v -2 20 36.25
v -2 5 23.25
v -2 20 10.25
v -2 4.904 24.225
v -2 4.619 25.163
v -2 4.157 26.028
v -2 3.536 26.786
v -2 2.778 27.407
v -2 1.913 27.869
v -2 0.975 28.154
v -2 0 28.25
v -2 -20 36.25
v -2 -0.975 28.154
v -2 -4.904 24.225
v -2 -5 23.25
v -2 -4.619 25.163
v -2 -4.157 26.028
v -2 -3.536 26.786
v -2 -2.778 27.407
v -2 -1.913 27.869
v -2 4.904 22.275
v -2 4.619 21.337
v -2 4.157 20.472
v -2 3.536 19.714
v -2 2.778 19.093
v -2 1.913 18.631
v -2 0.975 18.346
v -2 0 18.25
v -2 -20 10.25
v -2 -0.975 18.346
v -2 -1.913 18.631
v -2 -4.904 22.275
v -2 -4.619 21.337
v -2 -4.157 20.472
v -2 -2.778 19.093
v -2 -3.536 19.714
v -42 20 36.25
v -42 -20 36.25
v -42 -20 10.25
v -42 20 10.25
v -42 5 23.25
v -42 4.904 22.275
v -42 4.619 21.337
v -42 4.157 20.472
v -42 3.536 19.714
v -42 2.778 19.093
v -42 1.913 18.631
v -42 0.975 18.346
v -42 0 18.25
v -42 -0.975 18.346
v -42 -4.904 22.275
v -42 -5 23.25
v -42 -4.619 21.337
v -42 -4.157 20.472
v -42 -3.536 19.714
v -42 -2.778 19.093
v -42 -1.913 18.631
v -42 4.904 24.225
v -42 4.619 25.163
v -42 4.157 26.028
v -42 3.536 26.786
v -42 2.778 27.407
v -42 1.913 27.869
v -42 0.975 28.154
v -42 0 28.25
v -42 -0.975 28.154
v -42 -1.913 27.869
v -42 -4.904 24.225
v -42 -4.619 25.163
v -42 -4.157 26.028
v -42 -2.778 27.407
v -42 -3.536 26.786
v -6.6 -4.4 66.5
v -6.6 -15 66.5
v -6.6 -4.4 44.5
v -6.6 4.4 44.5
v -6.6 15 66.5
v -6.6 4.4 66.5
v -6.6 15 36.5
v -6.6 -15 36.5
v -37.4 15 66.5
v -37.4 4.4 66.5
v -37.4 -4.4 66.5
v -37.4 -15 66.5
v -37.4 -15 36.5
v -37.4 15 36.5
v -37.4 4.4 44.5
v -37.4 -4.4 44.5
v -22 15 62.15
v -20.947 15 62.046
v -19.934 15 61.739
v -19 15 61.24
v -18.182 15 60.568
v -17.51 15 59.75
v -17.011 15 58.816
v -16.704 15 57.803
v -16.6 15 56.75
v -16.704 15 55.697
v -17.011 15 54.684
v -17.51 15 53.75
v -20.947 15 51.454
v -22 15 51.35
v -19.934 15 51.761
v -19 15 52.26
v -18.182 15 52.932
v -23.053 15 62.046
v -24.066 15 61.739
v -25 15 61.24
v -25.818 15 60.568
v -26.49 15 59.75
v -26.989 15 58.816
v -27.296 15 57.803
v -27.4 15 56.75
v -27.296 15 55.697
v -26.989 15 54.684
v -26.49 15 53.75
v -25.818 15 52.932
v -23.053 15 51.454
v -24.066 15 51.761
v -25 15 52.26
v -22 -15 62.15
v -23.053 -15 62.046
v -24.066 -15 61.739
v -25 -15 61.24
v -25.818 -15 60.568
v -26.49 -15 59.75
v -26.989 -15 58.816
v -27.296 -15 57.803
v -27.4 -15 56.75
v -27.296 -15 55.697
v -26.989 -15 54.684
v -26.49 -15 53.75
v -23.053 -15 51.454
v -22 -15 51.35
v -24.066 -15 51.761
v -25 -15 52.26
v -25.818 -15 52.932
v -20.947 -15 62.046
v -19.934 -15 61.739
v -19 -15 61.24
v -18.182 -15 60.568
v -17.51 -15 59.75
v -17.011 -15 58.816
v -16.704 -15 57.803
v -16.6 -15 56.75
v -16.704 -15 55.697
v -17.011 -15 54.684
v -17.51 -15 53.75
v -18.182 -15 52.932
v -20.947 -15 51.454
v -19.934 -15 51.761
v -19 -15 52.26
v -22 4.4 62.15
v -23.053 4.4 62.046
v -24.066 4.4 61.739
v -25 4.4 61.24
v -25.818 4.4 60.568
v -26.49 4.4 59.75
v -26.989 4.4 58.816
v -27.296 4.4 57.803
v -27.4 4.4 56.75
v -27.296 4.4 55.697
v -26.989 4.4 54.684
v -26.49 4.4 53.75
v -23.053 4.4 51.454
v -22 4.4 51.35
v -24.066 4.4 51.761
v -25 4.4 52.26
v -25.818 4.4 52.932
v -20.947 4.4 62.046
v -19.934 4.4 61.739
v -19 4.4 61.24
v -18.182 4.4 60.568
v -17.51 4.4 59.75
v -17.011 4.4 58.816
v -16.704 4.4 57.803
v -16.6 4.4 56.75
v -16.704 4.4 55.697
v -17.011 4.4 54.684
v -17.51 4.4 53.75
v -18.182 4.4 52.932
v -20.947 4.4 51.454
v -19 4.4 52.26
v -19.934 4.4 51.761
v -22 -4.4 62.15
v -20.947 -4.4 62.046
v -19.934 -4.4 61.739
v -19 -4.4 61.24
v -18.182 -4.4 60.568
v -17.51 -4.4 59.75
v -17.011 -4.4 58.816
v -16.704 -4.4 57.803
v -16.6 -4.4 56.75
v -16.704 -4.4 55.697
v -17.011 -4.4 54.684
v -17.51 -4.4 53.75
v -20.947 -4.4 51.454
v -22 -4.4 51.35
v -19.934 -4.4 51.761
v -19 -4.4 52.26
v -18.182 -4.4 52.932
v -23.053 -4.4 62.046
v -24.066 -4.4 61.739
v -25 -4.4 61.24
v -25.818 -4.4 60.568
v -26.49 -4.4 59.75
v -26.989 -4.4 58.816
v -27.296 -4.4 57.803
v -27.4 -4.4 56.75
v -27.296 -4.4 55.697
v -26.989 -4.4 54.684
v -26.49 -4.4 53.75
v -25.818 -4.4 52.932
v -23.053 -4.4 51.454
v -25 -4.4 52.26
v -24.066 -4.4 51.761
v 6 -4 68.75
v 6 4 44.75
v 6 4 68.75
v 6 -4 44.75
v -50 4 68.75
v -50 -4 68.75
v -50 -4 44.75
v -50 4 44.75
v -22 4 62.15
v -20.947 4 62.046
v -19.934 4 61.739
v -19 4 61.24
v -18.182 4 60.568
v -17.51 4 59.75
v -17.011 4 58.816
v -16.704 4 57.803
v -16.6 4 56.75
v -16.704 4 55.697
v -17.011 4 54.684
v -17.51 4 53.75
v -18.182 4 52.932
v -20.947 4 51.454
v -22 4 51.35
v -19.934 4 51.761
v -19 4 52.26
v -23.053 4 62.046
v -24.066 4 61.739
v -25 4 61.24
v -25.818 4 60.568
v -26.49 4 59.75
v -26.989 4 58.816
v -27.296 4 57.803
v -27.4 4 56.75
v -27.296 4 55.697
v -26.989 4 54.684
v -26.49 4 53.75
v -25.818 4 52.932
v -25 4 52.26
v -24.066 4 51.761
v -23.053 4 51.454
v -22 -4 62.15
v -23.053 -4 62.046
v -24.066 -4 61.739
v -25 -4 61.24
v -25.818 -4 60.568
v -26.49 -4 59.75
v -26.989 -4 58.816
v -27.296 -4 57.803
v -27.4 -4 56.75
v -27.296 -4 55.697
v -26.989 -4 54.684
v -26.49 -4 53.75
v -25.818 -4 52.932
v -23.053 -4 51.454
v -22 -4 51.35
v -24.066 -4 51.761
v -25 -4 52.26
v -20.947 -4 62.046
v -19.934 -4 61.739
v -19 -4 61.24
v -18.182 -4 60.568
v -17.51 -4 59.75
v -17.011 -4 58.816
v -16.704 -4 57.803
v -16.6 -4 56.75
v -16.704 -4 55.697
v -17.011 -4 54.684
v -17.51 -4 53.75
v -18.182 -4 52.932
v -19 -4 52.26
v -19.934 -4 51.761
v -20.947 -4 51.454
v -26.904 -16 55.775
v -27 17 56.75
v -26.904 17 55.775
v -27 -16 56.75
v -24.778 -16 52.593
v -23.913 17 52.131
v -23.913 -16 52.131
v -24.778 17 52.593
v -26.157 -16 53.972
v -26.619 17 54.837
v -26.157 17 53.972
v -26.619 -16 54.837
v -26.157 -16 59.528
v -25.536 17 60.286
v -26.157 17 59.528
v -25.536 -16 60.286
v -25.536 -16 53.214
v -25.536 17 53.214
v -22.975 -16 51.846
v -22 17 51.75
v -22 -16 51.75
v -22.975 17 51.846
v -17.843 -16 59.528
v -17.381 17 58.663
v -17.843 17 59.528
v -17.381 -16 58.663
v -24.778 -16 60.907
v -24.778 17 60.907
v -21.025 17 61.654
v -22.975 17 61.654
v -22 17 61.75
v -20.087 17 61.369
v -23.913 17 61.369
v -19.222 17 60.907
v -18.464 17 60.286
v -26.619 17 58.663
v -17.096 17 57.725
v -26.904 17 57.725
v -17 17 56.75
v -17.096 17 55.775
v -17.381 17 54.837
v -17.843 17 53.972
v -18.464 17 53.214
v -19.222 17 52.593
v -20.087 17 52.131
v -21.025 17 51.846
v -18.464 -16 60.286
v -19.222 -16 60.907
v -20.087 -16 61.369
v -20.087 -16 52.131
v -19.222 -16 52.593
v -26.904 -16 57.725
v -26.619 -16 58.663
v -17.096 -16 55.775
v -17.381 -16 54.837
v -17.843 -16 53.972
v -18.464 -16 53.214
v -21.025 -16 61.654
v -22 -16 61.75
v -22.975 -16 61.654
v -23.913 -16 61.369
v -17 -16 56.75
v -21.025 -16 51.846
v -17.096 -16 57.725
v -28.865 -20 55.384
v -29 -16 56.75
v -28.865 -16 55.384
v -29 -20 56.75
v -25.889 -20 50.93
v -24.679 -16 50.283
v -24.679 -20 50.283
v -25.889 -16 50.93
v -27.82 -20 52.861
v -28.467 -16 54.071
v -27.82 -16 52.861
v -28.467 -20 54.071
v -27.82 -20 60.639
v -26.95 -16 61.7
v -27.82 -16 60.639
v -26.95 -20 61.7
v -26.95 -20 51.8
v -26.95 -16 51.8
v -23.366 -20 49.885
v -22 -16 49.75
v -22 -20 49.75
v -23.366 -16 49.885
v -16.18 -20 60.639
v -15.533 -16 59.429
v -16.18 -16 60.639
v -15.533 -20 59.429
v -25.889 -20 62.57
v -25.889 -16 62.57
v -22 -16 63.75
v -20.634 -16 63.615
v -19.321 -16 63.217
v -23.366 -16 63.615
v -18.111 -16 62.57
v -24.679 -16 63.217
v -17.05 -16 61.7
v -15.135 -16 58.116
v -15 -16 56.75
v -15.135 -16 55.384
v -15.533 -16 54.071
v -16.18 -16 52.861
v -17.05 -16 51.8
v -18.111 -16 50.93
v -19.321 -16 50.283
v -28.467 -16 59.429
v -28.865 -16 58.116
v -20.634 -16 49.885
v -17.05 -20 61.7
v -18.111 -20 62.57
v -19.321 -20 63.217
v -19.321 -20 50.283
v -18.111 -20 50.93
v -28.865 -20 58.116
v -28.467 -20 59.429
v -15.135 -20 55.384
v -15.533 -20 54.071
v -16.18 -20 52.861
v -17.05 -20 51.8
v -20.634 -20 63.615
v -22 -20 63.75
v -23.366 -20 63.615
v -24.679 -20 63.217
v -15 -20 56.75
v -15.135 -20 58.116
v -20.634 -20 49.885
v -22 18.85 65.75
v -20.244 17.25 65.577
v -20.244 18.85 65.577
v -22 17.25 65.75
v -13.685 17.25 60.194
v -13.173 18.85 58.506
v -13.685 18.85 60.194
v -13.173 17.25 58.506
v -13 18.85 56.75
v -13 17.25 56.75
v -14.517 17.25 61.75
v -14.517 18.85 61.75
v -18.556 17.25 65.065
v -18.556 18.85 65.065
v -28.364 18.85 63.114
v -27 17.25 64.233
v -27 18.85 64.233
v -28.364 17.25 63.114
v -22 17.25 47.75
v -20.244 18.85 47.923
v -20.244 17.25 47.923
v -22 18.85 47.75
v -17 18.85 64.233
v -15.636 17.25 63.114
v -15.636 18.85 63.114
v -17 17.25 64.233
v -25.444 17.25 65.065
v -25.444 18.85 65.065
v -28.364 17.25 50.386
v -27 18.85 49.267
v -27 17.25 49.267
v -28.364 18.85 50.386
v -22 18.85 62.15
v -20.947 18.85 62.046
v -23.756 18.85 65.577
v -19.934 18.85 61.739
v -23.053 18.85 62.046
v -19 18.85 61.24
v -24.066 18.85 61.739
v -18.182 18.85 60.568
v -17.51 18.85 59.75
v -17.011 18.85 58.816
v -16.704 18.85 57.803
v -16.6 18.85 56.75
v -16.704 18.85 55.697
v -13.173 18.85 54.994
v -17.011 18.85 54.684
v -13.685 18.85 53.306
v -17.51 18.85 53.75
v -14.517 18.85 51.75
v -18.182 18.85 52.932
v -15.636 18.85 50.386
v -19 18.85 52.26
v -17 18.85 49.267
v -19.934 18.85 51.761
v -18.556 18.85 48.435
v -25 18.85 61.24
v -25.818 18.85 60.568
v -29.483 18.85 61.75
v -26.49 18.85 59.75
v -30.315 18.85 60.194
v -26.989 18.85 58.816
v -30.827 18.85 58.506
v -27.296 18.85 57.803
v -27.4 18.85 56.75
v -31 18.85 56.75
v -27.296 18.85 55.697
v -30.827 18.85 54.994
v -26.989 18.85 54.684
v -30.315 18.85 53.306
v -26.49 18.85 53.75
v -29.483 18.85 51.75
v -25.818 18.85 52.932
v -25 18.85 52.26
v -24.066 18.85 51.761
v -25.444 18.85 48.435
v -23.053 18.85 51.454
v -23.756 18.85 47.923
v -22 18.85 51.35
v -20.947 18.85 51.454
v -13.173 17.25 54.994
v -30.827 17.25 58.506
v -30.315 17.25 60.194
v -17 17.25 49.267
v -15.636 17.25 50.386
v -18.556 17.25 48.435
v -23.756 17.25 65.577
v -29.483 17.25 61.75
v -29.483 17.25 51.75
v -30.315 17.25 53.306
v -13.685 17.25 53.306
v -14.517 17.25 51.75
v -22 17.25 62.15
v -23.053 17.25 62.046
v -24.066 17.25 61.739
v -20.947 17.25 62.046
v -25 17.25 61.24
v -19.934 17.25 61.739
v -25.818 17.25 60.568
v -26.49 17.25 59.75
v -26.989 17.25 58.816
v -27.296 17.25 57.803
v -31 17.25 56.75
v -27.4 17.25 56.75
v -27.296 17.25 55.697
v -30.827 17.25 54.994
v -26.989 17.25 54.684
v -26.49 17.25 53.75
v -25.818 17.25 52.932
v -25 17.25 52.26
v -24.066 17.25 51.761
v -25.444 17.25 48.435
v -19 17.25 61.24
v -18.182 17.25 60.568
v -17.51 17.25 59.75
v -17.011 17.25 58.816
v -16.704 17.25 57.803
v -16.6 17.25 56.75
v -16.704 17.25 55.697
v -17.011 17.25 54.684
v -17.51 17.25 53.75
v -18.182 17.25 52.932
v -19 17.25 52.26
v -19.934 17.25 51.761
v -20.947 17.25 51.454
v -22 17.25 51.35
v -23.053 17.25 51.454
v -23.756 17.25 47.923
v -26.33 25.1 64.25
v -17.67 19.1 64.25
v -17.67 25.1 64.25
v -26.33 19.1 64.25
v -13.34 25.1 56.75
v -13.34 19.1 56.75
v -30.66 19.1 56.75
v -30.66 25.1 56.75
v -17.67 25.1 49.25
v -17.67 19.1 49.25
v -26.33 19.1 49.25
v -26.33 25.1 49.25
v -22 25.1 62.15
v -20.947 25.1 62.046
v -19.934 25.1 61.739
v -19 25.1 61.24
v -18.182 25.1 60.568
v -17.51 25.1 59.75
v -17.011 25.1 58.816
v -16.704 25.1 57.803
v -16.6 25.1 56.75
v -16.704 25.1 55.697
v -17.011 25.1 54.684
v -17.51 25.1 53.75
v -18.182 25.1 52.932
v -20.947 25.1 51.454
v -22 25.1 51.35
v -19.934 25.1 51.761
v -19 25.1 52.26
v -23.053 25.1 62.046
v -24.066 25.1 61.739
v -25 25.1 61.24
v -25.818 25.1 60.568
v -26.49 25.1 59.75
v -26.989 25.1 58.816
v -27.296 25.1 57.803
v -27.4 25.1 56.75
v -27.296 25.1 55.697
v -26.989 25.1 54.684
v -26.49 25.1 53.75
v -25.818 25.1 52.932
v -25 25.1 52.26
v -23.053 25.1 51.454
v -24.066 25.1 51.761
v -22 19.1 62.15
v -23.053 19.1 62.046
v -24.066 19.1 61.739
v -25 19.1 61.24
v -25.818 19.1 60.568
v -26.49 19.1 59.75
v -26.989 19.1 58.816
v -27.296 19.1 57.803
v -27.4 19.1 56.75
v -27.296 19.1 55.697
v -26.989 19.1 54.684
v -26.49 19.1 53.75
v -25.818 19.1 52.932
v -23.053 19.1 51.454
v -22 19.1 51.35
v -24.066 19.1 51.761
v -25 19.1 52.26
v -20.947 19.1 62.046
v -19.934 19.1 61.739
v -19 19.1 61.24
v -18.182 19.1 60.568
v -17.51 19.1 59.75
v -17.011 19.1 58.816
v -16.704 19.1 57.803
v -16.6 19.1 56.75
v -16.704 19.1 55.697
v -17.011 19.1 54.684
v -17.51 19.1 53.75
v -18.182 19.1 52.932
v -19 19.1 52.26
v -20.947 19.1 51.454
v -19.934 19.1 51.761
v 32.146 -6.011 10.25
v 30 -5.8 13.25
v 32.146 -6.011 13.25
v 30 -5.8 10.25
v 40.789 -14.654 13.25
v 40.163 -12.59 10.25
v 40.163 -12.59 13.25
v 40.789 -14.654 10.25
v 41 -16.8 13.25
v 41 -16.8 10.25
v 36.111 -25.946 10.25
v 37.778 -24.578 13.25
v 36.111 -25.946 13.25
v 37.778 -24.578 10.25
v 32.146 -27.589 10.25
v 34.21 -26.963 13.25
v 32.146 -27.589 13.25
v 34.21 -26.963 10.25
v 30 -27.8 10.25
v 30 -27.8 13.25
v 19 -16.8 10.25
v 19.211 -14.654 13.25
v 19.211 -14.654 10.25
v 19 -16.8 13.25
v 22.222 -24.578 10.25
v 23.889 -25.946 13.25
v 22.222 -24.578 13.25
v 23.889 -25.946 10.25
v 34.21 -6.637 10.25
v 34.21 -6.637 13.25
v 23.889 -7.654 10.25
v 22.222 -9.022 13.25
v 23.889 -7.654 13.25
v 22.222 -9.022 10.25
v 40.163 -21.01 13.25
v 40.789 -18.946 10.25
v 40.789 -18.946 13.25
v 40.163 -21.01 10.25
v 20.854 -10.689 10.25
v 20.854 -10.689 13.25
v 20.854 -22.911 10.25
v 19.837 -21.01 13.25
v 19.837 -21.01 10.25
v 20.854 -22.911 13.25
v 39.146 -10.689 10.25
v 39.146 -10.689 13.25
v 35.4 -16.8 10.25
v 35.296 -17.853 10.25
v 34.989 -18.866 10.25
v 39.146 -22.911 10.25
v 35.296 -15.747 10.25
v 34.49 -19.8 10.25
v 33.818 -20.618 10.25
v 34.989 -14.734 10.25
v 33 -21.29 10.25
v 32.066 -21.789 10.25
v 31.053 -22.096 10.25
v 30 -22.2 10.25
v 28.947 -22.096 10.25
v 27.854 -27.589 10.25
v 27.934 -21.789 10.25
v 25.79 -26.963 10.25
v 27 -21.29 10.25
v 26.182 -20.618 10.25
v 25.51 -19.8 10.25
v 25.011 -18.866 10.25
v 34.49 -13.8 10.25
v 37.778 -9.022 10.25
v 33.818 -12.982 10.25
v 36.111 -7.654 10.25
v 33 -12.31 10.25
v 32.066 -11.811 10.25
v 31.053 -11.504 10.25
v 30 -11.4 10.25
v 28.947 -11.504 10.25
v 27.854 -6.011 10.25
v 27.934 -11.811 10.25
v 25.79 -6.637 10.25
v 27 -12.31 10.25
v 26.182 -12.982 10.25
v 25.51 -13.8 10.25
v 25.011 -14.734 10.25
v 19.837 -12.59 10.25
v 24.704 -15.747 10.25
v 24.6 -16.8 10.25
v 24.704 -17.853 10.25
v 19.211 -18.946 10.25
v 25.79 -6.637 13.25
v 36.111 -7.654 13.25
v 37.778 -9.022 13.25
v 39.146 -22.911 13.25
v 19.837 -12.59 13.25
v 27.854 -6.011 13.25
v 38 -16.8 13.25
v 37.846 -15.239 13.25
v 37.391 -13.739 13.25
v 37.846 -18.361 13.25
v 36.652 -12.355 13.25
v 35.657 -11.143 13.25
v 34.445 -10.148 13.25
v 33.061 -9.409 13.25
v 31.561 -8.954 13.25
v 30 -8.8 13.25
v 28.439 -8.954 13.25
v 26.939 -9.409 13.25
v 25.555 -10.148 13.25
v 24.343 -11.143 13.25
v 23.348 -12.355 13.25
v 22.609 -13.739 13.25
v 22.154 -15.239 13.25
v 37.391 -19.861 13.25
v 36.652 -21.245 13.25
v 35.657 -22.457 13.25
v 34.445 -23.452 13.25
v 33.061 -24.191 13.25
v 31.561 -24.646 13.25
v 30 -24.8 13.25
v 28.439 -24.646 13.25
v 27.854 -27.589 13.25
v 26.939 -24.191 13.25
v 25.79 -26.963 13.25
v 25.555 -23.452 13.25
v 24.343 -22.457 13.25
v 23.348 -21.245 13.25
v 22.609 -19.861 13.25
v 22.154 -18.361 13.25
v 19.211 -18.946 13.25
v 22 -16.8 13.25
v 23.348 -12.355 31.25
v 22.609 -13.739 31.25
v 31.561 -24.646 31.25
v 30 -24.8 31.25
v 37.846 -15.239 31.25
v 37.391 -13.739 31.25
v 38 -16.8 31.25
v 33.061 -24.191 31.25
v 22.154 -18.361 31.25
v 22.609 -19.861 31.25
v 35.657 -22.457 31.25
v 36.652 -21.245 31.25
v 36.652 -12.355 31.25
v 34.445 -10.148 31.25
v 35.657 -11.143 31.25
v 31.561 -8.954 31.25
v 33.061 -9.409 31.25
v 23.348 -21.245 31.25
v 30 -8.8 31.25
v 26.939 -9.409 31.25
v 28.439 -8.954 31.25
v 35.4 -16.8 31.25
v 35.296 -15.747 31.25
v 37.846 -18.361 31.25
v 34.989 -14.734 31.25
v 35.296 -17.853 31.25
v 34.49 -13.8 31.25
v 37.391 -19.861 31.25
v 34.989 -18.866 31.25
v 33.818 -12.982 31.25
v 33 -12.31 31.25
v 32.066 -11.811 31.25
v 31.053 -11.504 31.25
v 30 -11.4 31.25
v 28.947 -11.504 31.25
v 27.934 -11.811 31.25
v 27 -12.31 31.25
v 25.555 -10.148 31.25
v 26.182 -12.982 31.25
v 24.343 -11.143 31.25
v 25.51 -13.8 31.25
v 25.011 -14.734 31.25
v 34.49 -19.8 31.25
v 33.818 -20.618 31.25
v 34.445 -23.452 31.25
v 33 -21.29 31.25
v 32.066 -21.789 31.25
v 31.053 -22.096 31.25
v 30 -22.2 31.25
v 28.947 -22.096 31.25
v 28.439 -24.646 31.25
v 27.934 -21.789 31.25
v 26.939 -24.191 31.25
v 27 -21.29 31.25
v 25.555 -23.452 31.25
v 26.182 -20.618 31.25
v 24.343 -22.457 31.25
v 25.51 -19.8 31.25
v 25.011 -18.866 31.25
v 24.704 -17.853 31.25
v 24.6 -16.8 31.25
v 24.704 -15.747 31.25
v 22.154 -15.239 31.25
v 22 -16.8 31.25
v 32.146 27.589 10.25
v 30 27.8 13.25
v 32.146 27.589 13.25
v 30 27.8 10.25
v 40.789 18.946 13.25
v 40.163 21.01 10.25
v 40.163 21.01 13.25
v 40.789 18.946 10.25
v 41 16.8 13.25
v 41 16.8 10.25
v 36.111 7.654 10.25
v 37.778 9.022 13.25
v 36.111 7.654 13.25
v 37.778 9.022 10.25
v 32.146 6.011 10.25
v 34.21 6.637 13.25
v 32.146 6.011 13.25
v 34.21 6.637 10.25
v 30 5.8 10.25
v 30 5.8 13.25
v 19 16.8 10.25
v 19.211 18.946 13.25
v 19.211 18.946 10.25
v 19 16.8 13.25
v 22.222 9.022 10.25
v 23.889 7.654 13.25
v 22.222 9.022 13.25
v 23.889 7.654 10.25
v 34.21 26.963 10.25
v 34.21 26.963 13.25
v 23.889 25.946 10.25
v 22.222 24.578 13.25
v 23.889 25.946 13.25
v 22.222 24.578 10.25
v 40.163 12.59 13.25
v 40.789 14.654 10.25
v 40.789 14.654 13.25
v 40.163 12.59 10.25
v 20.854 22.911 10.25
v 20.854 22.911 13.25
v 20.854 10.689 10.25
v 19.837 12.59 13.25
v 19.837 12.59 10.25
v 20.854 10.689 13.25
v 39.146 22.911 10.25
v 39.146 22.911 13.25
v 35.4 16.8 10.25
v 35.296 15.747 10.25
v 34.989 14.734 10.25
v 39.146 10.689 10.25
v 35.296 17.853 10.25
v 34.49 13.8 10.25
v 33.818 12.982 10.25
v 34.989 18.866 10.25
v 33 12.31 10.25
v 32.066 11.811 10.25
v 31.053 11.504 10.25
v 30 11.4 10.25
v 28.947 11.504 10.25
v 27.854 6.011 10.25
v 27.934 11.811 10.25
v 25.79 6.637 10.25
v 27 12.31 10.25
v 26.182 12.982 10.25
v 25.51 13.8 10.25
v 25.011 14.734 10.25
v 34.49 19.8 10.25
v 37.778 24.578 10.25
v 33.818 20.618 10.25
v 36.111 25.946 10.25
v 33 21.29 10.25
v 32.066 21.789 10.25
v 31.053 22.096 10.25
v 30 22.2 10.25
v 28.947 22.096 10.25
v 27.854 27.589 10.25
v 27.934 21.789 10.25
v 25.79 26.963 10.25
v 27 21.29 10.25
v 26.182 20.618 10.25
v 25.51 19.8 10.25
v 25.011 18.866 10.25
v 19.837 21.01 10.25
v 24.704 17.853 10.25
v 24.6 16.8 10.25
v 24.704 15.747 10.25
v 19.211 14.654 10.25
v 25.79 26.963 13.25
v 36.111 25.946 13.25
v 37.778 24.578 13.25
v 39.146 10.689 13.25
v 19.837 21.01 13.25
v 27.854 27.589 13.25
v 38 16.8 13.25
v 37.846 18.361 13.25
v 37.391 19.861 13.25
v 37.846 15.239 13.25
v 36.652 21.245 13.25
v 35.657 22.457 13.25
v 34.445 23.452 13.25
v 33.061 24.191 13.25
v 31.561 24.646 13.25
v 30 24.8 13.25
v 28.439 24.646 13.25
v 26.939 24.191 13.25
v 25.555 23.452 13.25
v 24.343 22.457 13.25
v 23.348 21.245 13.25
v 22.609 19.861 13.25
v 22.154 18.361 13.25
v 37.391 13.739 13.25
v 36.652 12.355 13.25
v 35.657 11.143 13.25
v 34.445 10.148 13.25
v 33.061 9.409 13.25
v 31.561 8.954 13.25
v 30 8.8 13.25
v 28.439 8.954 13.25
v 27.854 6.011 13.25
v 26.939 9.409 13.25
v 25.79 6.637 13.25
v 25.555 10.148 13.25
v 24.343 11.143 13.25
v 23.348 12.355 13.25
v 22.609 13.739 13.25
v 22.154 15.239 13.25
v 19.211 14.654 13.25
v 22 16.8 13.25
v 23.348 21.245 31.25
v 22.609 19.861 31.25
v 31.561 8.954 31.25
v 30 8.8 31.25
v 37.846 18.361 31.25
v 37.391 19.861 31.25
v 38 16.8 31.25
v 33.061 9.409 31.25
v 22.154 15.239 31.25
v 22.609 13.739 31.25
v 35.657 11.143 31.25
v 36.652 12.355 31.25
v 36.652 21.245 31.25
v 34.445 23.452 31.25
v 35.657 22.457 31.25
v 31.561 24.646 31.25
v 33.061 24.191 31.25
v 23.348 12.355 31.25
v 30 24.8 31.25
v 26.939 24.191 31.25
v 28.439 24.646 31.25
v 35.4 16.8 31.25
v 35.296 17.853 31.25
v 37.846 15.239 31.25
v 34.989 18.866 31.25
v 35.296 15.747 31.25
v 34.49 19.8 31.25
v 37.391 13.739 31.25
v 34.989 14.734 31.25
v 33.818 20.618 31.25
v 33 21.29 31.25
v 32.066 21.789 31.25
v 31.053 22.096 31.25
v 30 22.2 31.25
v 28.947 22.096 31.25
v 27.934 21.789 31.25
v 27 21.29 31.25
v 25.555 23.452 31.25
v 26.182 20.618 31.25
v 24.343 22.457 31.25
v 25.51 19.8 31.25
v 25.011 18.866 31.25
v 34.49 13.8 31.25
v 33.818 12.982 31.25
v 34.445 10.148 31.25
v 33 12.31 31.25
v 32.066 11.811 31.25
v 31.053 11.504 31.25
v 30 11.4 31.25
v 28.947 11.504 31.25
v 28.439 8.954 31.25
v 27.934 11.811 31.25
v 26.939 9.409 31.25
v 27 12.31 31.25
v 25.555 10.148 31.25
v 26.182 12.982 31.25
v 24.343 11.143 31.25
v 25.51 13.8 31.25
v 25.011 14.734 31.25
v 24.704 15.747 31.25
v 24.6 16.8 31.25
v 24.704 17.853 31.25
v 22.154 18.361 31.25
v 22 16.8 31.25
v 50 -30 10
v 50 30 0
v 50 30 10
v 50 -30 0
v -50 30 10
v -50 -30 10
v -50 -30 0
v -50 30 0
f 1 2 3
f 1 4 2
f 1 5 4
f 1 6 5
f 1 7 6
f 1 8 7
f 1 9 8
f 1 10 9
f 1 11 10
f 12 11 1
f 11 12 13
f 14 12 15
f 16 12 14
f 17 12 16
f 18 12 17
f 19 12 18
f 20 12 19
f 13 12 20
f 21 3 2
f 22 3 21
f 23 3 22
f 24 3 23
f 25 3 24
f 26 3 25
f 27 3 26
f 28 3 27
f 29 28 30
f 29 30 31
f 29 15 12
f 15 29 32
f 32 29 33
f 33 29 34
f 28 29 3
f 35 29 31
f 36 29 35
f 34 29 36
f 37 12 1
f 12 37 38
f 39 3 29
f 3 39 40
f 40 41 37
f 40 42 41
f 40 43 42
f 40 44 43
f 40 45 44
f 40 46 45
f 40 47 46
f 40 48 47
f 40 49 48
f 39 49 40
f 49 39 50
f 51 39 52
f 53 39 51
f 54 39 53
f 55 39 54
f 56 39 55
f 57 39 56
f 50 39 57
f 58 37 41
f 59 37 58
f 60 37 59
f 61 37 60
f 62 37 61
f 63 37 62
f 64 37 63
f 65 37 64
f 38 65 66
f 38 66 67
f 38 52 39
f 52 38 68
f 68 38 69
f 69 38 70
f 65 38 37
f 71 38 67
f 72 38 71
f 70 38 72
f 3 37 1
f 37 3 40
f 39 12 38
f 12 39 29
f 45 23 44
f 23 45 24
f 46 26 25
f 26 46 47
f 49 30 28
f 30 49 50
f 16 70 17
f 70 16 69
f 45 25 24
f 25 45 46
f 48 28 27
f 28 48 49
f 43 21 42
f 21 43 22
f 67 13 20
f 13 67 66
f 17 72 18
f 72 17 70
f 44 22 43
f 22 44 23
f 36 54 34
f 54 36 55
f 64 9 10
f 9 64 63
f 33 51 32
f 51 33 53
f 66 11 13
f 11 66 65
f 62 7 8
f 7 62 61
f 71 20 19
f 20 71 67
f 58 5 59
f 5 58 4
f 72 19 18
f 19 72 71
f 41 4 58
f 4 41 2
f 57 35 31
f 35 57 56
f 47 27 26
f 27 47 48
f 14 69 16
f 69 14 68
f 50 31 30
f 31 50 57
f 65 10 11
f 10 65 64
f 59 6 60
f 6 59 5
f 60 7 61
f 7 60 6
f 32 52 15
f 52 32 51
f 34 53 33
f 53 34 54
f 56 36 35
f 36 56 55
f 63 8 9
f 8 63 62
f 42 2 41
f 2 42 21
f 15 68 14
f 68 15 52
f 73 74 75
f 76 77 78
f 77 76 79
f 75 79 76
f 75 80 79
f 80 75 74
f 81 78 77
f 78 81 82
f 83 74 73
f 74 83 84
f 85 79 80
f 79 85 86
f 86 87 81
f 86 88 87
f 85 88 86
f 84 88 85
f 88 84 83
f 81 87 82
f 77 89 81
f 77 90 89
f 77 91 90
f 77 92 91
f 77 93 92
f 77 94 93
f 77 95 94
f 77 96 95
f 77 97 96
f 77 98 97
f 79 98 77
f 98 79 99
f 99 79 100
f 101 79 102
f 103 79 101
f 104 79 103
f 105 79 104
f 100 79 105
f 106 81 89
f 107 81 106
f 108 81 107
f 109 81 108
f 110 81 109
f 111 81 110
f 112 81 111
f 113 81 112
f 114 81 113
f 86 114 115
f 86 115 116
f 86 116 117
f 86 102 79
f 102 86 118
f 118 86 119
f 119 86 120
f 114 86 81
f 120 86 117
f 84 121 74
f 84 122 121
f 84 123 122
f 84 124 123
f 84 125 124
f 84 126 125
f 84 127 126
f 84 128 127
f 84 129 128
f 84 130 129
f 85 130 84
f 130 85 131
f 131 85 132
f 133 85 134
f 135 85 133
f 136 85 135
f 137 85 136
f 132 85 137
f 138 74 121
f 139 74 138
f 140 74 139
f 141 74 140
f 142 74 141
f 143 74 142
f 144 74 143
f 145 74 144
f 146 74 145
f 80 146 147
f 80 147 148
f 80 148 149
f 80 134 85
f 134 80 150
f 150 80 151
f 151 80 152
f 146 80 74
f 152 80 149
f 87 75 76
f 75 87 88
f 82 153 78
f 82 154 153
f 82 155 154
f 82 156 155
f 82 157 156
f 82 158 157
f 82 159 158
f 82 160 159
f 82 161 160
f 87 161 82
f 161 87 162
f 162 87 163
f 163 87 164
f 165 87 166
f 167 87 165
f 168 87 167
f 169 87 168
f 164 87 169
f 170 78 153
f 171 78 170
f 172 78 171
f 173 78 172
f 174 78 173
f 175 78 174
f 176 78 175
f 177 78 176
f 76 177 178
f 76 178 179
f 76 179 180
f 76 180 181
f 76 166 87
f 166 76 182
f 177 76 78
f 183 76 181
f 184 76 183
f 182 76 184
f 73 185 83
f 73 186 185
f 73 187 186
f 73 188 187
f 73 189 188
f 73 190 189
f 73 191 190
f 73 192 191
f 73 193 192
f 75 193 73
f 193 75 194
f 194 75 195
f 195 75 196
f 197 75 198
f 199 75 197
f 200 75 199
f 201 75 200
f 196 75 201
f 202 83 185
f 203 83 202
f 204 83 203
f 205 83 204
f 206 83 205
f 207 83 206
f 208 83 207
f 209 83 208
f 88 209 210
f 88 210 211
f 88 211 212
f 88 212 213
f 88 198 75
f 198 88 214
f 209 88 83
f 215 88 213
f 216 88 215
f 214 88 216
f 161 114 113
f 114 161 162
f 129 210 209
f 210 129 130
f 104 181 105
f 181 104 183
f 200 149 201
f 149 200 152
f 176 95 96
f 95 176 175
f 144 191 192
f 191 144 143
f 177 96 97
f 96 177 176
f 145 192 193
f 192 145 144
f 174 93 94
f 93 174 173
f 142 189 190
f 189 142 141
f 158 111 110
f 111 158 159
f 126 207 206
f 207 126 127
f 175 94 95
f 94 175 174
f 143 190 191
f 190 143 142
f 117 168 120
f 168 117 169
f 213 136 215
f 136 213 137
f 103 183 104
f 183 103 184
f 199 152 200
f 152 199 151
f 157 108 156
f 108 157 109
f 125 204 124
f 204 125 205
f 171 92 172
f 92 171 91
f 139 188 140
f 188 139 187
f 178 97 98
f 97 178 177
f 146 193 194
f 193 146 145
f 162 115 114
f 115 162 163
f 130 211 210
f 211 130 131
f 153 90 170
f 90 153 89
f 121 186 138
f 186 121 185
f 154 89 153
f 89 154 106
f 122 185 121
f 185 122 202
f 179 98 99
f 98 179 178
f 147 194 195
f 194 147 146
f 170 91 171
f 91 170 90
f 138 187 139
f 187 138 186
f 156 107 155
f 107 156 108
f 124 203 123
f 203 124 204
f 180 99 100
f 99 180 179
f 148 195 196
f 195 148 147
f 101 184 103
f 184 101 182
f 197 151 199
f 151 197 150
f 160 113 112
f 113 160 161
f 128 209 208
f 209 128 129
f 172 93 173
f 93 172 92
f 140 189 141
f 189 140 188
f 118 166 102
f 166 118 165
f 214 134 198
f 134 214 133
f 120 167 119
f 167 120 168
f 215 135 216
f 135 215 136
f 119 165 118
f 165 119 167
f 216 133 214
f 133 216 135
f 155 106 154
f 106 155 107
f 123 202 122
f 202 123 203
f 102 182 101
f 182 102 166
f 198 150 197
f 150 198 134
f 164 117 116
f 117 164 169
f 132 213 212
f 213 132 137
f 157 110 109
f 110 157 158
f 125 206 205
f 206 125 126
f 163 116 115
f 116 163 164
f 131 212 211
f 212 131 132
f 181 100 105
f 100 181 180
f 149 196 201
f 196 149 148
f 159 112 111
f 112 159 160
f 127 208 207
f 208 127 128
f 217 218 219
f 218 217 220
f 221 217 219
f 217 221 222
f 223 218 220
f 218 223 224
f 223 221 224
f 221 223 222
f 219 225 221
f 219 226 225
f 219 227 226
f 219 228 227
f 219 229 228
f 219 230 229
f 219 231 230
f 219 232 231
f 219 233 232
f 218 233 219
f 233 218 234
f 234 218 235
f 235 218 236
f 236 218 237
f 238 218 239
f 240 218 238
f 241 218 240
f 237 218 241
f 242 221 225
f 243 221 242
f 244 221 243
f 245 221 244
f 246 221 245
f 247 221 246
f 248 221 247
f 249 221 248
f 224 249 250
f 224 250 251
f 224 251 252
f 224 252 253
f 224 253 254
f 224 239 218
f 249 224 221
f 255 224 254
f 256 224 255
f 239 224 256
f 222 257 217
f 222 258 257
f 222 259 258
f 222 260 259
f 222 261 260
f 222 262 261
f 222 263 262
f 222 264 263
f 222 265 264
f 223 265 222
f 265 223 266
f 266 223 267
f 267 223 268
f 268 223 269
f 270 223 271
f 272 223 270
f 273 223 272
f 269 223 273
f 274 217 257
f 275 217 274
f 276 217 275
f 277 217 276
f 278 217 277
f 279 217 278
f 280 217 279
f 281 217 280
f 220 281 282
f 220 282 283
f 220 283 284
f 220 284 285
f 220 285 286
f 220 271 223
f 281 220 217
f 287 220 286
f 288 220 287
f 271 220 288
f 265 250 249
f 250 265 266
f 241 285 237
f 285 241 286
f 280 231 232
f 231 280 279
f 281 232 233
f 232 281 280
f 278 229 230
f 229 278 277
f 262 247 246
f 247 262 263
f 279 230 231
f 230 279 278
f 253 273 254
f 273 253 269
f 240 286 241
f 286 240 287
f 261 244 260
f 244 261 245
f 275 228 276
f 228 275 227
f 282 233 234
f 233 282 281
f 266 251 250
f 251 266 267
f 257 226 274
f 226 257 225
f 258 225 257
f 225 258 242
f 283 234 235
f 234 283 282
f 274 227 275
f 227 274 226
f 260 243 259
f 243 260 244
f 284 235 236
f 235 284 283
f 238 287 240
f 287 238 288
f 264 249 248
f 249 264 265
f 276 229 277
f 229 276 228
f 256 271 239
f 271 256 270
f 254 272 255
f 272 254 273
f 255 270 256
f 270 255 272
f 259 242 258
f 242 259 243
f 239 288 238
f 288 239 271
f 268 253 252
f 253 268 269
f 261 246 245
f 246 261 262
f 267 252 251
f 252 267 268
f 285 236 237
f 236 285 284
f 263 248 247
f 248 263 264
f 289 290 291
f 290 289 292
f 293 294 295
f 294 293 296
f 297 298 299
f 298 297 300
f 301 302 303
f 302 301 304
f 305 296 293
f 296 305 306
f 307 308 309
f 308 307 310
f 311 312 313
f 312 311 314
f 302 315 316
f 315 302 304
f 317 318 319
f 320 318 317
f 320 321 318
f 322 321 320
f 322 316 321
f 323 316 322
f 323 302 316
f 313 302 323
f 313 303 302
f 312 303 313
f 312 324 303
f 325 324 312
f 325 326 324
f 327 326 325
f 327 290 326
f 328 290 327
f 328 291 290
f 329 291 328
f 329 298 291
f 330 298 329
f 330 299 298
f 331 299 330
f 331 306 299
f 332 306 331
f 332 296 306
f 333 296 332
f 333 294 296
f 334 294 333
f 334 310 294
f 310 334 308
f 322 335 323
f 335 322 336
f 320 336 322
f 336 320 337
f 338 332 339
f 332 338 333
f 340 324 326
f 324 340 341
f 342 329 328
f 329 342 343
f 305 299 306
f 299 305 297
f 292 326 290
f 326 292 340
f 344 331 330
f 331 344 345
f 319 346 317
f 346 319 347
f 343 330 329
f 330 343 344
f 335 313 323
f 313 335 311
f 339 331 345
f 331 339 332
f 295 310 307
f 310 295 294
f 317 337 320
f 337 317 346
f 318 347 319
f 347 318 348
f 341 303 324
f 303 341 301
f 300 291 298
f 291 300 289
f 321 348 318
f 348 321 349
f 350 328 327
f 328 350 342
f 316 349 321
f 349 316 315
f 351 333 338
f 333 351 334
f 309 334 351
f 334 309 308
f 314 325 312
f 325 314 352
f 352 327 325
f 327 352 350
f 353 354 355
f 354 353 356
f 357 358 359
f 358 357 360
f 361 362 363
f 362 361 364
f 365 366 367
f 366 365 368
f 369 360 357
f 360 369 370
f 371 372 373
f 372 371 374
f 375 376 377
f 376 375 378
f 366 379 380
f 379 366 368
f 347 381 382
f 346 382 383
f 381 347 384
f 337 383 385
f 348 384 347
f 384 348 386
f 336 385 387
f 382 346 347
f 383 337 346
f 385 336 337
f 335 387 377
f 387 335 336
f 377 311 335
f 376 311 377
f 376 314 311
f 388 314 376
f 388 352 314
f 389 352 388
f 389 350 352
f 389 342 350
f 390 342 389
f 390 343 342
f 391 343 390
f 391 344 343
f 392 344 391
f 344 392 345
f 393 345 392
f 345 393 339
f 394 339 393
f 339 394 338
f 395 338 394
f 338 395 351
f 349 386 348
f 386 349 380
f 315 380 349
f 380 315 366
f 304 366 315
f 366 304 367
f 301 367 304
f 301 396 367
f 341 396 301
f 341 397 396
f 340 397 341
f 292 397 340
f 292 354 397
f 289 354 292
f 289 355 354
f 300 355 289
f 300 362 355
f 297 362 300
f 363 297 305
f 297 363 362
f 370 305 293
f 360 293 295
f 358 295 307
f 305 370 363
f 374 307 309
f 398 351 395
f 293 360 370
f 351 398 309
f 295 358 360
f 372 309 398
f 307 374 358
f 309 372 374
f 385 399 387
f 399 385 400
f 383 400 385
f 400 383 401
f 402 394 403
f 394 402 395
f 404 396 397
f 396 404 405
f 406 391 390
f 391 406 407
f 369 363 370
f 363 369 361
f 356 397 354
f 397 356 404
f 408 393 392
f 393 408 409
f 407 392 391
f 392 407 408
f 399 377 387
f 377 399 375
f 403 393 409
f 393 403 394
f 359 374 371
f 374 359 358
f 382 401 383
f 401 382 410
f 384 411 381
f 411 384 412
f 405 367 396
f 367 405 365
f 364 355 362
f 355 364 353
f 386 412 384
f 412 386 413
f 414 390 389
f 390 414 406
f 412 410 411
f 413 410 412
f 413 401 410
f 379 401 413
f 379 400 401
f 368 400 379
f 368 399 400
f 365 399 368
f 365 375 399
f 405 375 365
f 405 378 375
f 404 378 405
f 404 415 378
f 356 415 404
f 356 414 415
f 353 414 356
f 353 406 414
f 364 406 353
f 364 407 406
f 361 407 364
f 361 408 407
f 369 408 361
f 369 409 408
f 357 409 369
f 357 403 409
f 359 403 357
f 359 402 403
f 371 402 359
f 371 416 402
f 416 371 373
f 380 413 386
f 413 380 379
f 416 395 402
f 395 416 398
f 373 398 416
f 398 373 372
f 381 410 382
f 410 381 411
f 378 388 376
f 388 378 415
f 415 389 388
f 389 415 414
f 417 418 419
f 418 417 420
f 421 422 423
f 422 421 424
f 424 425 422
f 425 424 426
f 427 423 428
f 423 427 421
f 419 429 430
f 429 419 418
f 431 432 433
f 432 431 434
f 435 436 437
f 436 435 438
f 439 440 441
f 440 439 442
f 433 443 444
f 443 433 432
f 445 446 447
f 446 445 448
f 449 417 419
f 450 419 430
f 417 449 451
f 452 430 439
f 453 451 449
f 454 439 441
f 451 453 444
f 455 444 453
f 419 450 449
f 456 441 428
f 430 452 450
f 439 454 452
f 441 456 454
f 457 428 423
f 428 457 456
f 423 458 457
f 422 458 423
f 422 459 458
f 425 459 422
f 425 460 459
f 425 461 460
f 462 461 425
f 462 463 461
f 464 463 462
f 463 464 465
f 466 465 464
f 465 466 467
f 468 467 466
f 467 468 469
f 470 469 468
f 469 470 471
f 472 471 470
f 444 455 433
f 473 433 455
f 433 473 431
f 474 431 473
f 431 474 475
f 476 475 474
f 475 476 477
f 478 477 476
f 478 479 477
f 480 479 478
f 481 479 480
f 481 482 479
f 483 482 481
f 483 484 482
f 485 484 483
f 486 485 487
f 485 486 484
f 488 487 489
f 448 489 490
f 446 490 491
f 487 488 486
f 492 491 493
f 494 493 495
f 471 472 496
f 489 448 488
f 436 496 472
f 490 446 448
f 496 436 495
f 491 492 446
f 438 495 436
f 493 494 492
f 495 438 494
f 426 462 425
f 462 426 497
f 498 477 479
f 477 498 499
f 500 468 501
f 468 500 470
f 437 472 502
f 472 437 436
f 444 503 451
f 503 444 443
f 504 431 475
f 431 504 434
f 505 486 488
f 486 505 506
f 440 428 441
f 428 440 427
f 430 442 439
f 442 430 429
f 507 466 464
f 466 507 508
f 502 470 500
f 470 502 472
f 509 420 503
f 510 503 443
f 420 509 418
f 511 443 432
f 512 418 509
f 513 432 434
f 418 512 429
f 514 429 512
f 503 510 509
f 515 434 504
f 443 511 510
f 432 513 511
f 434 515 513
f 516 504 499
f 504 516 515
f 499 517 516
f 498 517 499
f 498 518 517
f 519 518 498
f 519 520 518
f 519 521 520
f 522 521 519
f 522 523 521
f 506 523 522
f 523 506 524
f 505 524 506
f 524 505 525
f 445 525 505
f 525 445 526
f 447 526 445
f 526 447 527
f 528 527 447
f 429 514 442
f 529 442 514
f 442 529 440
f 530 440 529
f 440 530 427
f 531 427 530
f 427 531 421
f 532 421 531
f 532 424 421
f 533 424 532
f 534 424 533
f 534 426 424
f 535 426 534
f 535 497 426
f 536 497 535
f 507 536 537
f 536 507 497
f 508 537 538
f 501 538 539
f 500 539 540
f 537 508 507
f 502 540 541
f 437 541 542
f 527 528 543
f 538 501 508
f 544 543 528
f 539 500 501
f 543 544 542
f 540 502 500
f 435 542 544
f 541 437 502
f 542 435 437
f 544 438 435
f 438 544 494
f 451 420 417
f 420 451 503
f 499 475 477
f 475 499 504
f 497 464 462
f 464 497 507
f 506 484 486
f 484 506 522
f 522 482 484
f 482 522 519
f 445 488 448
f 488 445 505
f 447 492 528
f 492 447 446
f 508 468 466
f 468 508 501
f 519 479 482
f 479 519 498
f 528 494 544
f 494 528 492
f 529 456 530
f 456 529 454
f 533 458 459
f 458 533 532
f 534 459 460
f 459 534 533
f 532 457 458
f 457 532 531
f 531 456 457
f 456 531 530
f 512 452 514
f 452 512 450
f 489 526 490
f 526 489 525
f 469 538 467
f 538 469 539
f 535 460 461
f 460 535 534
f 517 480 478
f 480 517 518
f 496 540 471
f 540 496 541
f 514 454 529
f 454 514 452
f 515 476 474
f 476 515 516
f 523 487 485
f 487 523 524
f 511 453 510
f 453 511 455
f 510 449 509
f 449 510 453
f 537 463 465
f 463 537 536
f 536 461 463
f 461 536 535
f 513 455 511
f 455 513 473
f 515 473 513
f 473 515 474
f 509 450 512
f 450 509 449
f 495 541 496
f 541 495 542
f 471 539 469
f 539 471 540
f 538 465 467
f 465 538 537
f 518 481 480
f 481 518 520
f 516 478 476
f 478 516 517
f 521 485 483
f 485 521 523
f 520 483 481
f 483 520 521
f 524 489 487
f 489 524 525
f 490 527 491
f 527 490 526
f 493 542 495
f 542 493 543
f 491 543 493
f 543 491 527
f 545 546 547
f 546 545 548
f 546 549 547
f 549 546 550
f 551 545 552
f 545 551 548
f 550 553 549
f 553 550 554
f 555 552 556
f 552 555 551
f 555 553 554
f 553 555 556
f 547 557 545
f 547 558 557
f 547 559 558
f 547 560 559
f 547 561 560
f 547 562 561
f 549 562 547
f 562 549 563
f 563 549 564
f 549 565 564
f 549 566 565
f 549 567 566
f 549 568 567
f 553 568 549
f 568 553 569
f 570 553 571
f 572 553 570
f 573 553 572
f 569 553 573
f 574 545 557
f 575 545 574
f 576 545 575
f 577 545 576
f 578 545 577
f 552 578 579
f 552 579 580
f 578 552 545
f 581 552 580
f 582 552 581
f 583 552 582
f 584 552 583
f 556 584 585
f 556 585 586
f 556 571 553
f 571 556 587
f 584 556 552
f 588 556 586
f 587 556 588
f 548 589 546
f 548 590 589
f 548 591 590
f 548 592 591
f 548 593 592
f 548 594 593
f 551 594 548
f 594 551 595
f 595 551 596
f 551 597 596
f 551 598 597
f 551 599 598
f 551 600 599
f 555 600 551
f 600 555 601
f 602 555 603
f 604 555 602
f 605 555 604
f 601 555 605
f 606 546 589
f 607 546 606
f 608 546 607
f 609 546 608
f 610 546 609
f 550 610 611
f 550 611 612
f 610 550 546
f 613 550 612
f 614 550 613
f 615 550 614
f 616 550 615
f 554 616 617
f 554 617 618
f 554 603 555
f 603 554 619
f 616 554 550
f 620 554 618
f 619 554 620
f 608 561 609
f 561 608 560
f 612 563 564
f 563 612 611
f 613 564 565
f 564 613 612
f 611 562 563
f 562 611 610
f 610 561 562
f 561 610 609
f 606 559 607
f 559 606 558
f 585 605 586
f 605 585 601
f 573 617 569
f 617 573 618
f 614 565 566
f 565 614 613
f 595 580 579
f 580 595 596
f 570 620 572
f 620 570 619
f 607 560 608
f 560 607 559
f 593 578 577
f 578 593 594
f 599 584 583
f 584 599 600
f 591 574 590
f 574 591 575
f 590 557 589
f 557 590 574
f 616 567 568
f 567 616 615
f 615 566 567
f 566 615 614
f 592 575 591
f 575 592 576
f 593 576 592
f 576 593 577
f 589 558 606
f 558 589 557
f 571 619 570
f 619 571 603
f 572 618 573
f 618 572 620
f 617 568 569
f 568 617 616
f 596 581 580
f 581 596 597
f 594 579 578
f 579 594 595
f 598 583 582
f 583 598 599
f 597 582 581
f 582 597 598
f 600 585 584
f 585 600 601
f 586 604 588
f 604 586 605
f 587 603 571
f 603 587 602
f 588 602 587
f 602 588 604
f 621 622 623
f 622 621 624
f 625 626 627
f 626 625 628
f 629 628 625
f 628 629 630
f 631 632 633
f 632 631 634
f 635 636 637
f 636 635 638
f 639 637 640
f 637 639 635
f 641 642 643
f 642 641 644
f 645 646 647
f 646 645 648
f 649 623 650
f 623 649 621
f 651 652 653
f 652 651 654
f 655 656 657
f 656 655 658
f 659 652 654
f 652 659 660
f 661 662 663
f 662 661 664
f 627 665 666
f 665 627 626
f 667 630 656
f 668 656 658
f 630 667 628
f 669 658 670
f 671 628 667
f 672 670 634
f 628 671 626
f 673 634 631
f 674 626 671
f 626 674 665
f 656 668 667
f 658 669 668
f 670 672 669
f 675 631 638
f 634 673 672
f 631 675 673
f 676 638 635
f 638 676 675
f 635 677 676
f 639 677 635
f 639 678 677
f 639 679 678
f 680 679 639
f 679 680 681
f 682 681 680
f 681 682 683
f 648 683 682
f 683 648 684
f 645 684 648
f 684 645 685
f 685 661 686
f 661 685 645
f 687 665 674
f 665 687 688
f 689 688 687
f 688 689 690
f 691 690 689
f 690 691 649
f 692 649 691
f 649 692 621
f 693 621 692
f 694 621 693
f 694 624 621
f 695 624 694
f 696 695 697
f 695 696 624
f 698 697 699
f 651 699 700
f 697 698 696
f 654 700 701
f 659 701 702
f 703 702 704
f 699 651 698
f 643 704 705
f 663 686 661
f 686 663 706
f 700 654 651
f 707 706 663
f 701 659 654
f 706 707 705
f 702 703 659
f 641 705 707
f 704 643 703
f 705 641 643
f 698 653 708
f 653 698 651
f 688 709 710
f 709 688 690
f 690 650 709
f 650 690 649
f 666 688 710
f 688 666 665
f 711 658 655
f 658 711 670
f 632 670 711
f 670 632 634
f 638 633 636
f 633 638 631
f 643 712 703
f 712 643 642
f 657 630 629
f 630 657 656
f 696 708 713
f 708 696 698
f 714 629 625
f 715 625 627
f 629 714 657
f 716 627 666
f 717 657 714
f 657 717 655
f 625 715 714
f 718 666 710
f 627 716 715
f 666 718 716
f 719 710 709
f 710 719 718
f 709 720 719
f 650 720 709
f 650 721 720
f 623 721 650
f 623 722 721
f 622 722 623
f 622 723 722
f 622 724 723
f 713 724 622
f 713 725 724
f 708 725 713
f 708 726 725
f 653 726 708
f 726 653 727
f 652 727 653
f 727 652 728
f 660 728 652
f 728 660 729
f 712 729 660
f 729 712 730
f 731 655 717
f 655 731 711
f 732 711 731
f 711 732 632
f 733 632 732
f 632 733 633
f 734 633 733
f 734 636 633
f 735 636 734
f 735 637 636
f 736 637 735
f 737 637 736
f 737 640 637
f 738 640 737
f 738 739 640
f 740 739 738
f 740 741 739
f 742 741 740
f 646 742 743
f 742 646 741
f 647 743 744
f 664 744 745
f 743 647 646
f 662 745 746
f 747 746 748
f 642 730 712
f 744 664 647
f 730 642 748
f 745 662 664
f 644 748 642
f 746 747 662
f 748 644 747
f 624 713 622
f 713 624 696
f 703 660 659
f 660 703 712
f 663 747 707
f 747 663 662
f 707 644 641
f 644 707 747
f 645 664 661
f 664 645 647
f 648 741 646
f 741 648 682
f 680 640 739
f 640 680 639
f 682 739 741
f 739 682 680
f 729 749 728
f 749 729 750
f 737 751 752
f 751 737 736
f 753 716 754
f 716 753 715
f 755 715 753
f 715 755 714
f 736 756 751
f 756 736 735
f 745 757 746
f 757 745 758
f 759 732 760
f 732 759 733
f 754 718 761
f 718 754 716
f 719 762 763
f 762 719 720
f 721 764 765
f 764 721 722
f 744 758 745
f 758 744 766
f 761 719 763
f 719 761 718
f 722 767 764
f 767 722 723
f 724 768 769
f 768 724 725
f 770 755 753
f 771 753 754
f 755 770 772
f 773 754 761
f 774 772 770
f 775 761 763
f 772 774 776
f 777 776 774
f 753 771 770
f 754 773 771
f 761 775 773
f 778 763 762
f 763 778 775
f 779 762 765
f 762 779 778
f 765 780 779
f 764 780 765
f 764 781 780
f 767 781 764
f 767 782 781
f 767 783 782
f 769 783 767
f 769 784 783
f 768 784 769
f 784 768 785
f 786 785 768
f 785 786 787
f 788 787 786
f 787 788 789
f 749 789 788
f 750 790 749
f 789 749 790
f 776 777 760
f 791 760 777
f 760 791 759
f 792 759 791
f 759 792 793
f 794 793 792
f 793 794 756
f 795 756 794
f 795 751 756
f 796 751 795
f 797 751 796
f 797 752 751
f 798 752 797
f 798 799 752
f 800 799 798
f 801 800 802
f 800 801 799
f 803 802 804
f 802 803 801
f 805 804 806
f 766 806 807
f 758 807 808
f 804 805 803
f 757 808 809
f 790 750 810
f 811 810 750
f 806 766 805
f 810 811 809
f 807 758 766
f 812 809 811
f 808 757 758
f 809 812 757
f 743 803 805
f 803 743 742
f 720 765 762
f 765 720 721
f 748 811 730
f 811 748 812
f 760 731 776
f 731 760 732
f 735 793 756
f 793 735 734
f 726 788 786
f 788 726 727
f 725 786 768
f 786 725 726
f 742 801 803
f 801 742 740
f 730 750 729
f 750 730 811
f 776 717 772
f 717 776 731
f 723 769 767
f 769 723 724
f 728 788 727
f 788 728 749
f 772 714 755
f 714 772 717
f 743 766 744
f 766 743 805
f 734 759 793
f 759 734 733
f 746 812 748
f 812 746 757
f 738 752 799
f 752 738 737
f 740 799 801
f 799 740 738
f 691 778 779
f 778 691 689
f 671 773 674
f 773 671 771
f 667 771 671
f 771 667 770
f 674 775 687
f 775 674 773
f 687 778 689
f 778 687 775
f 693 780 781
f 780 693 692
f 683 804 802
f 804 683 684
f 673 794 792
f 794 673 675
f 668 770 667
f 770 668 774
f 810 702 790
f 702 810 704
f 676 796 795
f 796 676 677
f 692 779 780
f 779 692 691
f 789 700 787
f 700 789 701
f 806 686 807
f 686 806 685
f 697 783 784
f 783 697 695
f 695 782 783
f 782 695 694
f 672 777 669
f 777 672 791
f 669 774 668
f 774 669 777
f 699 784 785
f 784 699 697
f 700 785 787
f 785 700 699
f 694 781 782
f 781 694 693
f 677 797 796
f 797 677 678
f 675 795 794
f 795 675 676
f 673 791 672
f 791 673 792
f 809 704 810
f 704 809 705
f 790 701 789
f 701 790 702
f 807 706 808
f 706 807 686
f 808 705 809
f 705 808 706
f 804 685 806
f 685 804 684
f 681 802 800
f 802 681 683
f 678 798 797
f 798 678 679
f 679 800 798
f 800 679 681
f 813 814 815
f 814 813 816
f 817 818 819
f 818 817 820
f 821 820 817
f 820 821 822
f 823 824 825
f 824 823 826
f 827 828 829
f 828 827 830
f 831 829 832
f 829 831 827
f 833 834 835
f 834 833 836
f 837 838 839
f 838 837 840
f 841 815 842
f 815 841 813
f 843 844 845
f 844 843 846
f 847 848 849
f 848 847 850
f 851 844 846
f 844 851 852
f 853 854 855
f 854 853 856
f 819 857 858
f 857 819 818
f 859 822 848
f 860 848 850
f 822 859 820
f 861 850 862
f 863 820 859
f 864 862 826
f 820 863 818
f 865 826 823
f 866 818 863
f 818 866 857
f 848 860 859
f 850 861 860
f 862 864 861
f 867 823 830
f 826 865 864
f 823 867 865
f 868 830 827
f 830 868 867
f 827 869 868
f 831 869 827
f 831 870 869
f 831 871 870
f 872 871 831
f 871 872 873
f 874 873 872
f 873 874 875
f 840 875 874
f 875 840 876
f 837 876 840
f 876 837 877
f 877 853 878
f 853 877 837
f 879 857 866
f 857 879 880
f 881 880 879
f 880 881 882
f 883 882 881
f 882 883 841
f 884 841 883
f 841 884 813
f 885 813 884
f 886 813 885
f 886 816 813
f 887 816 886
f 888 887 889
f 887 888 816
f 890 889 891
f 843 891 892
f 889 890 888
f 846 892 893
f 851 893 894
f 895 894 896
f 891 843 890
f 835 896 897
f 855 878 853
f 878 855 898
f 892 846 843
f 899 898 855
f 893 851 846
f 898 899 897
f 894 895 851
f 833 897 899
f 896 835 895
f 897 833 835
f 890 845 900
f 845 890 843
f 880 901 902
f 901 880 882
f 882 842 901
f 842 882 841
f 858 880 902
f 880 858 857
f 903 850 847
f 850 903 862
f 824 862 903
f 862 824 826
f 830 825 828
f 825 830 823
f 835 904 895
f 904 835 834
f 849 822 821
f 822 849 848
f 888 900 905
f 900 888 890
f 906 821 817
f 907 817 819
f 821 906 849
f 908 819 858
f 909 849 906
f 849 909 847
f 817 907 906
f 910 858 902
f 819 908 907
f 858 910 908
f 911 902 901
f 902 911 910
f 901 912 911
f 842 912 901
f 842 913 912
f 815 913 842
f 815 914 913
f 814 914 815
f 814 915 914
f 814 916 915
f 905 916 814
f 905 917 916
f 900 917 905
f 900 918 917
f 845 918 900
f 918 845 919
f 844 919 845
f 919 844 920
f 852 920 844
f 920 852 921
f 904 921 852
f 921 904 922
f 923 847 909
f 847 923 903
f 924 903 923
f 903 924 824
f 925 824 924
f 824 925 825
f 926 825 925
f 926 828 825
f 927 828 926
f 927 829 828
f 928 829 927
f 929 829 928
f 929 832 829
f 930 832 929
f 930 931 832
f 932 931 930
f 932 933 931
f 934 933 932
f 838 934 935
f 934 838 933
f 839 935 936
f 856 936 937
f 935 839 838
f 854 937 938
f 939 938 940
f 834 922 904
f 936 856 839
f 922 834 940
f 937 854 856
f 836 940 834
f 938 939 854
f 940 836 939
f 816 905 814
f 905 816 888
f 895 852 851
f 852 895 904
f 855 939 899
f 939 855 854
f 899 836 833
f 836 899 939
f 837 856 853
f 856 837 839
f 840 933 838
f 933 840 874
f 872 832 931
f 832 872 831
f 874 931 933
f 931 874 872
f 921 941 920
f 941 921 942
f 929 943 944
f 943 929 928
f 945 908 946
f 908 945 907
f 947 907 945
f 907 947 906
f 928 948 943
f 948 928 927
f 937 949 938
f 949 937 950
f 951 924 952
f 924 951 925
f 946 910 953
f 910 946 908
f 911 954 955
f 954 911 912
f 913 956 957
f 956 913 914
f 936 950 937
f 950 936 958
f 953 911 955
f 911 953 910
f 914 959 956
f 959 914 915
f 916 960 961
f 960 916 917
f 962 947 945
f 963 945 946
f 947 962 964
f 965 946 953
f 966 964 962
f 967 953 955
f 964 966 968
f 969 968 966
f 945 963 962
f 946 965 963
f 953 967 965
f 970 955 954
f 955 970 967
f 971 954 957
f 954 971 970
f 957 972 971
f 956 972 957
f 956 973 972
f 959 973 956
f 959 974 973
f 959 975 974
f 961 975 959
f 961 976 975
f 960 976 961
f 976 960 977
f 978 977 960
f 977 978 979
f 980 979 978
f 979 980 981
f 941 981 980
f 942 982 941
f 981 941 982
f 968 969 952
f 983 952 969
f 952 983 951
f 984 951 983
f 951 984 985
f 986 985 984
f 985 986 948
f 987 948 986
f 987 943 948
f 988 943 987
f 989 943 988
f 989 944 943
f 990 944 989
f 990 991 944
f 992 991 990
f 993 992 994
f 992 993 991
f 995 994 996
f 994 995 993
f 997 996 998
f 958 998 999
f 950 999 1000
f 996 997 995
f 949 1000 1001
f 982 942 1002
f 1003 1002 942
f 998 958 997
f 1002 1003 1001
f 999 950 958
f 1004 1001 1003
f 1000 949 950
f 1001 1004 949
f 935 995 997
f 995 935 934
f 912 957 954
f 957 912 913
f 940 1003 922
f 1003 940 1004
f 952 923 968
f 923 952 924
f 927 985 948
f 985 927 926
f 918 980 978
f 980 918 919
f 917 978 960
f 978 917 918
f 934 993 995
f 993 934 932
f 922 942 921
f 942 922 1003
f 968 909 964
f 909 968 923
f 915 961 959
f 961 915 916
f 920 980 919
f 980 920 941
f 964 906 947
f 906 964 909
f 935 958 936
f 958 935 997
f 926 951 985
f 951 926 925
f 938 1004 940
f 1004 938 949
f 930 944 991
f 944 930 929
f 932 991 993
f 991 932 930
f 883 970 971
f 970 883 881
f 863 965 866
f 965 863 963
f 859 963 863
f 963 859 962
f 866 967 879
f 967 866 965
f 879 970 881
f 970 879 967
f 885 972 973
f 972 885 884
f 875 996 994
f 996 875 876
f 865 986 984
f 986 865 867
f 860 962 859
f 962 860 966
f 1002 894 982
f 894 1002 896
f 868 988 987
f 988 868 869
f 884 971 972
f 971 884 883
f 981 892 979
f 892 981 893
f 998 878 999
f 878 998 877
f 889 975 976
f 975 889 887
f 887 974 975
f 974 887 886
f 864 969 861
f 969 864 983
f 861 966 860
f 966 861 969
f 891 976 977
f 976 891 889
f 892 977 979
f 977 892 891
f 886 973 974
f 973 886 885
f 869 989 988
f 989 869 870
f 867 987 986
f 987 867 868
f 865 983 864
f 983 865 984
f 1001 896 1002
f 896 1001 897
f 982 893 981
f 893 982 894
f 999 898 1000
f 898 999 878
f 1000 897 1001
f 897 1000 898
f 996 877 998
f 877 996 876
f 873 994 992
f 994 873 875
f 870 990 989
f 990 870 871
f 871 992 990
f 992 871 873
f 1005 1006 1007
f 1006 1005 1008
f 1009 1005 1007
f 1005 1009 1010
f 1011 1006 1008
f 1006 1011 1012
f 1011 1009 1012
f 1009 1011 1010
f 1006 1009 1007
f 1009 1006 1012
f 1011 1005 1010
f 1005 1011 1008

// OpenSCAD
$fn = 32;

// ------------------------------------------------------------------------
// Indexing jig: plate 100 x 60 mm, pin d10
// Every part is its own module, assembly() places every instance.
// ------------------------------------------------------------------------

// --- part 1 ---
module jig_plate() {
  difference() {
    translate([-50, -30, 0]) cube([100, 60, 10]);
  }
}

// --- part 2 ---
module locator_block() {
  difference() {
    translate([-20, -20, 0]) cube([40, 40, 26]);
    translate([0, 0, 13]) rotate([0, 90, 0]) cylinder(h = 42, d = 10, center = true);
  }
}

// --- part 3 ---
module index_fork() {
  difference() {
    translate([-15.4, -15, 0]) cube([30.8, 30, 30]);
    translate([-16.4, -4.4, 8]) cube([32.8, 8.8, 23]);
    translate([0, 0, 20.25]) rotate([90, 0, 0]) cylinder(h = 32, d = 10.8, center = true);
  }
}

// --- part 4 ---
module index_arm() {
  difference() {
    translate([-28, -4, 0]) cube([56, 8, 24]);
    translate([0, 0, 12]) rotate([90, 0, 0]) cylinder(h = 10, d = 10.8, center = true);
  }
}

// --- part 5 ---
module index_pin() {
  rotate([0, 90, 0]) cylinder(h = 34, d = 10, center = true);
  translate([-20, 0, 0]) rotate([0, 90, 0]) cylinder(h = 4, d = 14);
}

// --- part 6 ---
module pin_washer() {
  difference() {
      translate([0, 0, 0]) cylinder(h = 1.6, d = 18);
      translate([0, 0, -1]) cylinder(h = 3.6, d = 10.8);
    }
}

// --- part 7 ---
module lock_nut() {
  difference() {
    linear_extrude(height = 6) polygon(points = [[8.66, 0], [4.33, 7.5], [-4.33, 7.5], [-8.66, 0], [-4.33, -7.5], [4.33, -7.5]]);
    translate([0, 0, -1]) cylinder(h = 8, d = 10.8);
  }
}

// --- part 8 ---
module guide_bush_a() {
  difference() {
    union() {
      cylinder(h = 3, d = 22);
      translate([0, 0, 3]) cylinder(h = 18, d = 16);
    }
    translate([0, 0, -1]) cylinder(h = 23, d = 10.8);
  }
}

// --- part 9 ---
module guide_bush_b() {
  difference() {
    union() {
      cylinder(h = 3, d = 22);
      translate([0, 0, 3]) cylinder(h = 18, d = 16);
    }
    translate([0, 0, -1]) cylinder(h = 23, d = 10.8);
  }
}

// --- assembly ---
module assembly() {
  color([0.80, 0.24, 0.20]) translate([0, 0, 0]) rotate([0, 0, 0]) jig_plate();
  color([0.20, 0.45, 0.75]) translate([-22, 0, 10.25]) rotate([0, 0, 0]) locator_block();
  color([0.25, 0.62, 0.32]) translate([-22, 0, 36.5]) rotate([0, 0, 0]) index_fork();
  color([0.92, 0.70, 0.18]) translate([-22, 0, 44.75]) rotate([0, 0, 0]) index_arm();
  color([0.58, 0.35, 0.70]) translate([-22, 0, 56.75]) rotate([0, 0, 90]) index_pin();
  color([0.16, 0.66, 0.66]) translate([-22, 18.85, 56.75]) rotate([90, 0, 0]) pin_washer();
  color([0.85, 0.48, 0.18]) translate([-22, 25.1, 56.75]) rotate([90, 0, 0]) lock_nut();
  color([0.55, 0.60, 0.65]) translate([30, -16.8, 10.25]) rotate([0, 0, 0]) guide_bush_a();
  color([0.75, 0.30, 0.55]) translate([30, 16.8, 10.25]) rotate([0, 0, 0]) guide_bush_b();
}

assembly();
